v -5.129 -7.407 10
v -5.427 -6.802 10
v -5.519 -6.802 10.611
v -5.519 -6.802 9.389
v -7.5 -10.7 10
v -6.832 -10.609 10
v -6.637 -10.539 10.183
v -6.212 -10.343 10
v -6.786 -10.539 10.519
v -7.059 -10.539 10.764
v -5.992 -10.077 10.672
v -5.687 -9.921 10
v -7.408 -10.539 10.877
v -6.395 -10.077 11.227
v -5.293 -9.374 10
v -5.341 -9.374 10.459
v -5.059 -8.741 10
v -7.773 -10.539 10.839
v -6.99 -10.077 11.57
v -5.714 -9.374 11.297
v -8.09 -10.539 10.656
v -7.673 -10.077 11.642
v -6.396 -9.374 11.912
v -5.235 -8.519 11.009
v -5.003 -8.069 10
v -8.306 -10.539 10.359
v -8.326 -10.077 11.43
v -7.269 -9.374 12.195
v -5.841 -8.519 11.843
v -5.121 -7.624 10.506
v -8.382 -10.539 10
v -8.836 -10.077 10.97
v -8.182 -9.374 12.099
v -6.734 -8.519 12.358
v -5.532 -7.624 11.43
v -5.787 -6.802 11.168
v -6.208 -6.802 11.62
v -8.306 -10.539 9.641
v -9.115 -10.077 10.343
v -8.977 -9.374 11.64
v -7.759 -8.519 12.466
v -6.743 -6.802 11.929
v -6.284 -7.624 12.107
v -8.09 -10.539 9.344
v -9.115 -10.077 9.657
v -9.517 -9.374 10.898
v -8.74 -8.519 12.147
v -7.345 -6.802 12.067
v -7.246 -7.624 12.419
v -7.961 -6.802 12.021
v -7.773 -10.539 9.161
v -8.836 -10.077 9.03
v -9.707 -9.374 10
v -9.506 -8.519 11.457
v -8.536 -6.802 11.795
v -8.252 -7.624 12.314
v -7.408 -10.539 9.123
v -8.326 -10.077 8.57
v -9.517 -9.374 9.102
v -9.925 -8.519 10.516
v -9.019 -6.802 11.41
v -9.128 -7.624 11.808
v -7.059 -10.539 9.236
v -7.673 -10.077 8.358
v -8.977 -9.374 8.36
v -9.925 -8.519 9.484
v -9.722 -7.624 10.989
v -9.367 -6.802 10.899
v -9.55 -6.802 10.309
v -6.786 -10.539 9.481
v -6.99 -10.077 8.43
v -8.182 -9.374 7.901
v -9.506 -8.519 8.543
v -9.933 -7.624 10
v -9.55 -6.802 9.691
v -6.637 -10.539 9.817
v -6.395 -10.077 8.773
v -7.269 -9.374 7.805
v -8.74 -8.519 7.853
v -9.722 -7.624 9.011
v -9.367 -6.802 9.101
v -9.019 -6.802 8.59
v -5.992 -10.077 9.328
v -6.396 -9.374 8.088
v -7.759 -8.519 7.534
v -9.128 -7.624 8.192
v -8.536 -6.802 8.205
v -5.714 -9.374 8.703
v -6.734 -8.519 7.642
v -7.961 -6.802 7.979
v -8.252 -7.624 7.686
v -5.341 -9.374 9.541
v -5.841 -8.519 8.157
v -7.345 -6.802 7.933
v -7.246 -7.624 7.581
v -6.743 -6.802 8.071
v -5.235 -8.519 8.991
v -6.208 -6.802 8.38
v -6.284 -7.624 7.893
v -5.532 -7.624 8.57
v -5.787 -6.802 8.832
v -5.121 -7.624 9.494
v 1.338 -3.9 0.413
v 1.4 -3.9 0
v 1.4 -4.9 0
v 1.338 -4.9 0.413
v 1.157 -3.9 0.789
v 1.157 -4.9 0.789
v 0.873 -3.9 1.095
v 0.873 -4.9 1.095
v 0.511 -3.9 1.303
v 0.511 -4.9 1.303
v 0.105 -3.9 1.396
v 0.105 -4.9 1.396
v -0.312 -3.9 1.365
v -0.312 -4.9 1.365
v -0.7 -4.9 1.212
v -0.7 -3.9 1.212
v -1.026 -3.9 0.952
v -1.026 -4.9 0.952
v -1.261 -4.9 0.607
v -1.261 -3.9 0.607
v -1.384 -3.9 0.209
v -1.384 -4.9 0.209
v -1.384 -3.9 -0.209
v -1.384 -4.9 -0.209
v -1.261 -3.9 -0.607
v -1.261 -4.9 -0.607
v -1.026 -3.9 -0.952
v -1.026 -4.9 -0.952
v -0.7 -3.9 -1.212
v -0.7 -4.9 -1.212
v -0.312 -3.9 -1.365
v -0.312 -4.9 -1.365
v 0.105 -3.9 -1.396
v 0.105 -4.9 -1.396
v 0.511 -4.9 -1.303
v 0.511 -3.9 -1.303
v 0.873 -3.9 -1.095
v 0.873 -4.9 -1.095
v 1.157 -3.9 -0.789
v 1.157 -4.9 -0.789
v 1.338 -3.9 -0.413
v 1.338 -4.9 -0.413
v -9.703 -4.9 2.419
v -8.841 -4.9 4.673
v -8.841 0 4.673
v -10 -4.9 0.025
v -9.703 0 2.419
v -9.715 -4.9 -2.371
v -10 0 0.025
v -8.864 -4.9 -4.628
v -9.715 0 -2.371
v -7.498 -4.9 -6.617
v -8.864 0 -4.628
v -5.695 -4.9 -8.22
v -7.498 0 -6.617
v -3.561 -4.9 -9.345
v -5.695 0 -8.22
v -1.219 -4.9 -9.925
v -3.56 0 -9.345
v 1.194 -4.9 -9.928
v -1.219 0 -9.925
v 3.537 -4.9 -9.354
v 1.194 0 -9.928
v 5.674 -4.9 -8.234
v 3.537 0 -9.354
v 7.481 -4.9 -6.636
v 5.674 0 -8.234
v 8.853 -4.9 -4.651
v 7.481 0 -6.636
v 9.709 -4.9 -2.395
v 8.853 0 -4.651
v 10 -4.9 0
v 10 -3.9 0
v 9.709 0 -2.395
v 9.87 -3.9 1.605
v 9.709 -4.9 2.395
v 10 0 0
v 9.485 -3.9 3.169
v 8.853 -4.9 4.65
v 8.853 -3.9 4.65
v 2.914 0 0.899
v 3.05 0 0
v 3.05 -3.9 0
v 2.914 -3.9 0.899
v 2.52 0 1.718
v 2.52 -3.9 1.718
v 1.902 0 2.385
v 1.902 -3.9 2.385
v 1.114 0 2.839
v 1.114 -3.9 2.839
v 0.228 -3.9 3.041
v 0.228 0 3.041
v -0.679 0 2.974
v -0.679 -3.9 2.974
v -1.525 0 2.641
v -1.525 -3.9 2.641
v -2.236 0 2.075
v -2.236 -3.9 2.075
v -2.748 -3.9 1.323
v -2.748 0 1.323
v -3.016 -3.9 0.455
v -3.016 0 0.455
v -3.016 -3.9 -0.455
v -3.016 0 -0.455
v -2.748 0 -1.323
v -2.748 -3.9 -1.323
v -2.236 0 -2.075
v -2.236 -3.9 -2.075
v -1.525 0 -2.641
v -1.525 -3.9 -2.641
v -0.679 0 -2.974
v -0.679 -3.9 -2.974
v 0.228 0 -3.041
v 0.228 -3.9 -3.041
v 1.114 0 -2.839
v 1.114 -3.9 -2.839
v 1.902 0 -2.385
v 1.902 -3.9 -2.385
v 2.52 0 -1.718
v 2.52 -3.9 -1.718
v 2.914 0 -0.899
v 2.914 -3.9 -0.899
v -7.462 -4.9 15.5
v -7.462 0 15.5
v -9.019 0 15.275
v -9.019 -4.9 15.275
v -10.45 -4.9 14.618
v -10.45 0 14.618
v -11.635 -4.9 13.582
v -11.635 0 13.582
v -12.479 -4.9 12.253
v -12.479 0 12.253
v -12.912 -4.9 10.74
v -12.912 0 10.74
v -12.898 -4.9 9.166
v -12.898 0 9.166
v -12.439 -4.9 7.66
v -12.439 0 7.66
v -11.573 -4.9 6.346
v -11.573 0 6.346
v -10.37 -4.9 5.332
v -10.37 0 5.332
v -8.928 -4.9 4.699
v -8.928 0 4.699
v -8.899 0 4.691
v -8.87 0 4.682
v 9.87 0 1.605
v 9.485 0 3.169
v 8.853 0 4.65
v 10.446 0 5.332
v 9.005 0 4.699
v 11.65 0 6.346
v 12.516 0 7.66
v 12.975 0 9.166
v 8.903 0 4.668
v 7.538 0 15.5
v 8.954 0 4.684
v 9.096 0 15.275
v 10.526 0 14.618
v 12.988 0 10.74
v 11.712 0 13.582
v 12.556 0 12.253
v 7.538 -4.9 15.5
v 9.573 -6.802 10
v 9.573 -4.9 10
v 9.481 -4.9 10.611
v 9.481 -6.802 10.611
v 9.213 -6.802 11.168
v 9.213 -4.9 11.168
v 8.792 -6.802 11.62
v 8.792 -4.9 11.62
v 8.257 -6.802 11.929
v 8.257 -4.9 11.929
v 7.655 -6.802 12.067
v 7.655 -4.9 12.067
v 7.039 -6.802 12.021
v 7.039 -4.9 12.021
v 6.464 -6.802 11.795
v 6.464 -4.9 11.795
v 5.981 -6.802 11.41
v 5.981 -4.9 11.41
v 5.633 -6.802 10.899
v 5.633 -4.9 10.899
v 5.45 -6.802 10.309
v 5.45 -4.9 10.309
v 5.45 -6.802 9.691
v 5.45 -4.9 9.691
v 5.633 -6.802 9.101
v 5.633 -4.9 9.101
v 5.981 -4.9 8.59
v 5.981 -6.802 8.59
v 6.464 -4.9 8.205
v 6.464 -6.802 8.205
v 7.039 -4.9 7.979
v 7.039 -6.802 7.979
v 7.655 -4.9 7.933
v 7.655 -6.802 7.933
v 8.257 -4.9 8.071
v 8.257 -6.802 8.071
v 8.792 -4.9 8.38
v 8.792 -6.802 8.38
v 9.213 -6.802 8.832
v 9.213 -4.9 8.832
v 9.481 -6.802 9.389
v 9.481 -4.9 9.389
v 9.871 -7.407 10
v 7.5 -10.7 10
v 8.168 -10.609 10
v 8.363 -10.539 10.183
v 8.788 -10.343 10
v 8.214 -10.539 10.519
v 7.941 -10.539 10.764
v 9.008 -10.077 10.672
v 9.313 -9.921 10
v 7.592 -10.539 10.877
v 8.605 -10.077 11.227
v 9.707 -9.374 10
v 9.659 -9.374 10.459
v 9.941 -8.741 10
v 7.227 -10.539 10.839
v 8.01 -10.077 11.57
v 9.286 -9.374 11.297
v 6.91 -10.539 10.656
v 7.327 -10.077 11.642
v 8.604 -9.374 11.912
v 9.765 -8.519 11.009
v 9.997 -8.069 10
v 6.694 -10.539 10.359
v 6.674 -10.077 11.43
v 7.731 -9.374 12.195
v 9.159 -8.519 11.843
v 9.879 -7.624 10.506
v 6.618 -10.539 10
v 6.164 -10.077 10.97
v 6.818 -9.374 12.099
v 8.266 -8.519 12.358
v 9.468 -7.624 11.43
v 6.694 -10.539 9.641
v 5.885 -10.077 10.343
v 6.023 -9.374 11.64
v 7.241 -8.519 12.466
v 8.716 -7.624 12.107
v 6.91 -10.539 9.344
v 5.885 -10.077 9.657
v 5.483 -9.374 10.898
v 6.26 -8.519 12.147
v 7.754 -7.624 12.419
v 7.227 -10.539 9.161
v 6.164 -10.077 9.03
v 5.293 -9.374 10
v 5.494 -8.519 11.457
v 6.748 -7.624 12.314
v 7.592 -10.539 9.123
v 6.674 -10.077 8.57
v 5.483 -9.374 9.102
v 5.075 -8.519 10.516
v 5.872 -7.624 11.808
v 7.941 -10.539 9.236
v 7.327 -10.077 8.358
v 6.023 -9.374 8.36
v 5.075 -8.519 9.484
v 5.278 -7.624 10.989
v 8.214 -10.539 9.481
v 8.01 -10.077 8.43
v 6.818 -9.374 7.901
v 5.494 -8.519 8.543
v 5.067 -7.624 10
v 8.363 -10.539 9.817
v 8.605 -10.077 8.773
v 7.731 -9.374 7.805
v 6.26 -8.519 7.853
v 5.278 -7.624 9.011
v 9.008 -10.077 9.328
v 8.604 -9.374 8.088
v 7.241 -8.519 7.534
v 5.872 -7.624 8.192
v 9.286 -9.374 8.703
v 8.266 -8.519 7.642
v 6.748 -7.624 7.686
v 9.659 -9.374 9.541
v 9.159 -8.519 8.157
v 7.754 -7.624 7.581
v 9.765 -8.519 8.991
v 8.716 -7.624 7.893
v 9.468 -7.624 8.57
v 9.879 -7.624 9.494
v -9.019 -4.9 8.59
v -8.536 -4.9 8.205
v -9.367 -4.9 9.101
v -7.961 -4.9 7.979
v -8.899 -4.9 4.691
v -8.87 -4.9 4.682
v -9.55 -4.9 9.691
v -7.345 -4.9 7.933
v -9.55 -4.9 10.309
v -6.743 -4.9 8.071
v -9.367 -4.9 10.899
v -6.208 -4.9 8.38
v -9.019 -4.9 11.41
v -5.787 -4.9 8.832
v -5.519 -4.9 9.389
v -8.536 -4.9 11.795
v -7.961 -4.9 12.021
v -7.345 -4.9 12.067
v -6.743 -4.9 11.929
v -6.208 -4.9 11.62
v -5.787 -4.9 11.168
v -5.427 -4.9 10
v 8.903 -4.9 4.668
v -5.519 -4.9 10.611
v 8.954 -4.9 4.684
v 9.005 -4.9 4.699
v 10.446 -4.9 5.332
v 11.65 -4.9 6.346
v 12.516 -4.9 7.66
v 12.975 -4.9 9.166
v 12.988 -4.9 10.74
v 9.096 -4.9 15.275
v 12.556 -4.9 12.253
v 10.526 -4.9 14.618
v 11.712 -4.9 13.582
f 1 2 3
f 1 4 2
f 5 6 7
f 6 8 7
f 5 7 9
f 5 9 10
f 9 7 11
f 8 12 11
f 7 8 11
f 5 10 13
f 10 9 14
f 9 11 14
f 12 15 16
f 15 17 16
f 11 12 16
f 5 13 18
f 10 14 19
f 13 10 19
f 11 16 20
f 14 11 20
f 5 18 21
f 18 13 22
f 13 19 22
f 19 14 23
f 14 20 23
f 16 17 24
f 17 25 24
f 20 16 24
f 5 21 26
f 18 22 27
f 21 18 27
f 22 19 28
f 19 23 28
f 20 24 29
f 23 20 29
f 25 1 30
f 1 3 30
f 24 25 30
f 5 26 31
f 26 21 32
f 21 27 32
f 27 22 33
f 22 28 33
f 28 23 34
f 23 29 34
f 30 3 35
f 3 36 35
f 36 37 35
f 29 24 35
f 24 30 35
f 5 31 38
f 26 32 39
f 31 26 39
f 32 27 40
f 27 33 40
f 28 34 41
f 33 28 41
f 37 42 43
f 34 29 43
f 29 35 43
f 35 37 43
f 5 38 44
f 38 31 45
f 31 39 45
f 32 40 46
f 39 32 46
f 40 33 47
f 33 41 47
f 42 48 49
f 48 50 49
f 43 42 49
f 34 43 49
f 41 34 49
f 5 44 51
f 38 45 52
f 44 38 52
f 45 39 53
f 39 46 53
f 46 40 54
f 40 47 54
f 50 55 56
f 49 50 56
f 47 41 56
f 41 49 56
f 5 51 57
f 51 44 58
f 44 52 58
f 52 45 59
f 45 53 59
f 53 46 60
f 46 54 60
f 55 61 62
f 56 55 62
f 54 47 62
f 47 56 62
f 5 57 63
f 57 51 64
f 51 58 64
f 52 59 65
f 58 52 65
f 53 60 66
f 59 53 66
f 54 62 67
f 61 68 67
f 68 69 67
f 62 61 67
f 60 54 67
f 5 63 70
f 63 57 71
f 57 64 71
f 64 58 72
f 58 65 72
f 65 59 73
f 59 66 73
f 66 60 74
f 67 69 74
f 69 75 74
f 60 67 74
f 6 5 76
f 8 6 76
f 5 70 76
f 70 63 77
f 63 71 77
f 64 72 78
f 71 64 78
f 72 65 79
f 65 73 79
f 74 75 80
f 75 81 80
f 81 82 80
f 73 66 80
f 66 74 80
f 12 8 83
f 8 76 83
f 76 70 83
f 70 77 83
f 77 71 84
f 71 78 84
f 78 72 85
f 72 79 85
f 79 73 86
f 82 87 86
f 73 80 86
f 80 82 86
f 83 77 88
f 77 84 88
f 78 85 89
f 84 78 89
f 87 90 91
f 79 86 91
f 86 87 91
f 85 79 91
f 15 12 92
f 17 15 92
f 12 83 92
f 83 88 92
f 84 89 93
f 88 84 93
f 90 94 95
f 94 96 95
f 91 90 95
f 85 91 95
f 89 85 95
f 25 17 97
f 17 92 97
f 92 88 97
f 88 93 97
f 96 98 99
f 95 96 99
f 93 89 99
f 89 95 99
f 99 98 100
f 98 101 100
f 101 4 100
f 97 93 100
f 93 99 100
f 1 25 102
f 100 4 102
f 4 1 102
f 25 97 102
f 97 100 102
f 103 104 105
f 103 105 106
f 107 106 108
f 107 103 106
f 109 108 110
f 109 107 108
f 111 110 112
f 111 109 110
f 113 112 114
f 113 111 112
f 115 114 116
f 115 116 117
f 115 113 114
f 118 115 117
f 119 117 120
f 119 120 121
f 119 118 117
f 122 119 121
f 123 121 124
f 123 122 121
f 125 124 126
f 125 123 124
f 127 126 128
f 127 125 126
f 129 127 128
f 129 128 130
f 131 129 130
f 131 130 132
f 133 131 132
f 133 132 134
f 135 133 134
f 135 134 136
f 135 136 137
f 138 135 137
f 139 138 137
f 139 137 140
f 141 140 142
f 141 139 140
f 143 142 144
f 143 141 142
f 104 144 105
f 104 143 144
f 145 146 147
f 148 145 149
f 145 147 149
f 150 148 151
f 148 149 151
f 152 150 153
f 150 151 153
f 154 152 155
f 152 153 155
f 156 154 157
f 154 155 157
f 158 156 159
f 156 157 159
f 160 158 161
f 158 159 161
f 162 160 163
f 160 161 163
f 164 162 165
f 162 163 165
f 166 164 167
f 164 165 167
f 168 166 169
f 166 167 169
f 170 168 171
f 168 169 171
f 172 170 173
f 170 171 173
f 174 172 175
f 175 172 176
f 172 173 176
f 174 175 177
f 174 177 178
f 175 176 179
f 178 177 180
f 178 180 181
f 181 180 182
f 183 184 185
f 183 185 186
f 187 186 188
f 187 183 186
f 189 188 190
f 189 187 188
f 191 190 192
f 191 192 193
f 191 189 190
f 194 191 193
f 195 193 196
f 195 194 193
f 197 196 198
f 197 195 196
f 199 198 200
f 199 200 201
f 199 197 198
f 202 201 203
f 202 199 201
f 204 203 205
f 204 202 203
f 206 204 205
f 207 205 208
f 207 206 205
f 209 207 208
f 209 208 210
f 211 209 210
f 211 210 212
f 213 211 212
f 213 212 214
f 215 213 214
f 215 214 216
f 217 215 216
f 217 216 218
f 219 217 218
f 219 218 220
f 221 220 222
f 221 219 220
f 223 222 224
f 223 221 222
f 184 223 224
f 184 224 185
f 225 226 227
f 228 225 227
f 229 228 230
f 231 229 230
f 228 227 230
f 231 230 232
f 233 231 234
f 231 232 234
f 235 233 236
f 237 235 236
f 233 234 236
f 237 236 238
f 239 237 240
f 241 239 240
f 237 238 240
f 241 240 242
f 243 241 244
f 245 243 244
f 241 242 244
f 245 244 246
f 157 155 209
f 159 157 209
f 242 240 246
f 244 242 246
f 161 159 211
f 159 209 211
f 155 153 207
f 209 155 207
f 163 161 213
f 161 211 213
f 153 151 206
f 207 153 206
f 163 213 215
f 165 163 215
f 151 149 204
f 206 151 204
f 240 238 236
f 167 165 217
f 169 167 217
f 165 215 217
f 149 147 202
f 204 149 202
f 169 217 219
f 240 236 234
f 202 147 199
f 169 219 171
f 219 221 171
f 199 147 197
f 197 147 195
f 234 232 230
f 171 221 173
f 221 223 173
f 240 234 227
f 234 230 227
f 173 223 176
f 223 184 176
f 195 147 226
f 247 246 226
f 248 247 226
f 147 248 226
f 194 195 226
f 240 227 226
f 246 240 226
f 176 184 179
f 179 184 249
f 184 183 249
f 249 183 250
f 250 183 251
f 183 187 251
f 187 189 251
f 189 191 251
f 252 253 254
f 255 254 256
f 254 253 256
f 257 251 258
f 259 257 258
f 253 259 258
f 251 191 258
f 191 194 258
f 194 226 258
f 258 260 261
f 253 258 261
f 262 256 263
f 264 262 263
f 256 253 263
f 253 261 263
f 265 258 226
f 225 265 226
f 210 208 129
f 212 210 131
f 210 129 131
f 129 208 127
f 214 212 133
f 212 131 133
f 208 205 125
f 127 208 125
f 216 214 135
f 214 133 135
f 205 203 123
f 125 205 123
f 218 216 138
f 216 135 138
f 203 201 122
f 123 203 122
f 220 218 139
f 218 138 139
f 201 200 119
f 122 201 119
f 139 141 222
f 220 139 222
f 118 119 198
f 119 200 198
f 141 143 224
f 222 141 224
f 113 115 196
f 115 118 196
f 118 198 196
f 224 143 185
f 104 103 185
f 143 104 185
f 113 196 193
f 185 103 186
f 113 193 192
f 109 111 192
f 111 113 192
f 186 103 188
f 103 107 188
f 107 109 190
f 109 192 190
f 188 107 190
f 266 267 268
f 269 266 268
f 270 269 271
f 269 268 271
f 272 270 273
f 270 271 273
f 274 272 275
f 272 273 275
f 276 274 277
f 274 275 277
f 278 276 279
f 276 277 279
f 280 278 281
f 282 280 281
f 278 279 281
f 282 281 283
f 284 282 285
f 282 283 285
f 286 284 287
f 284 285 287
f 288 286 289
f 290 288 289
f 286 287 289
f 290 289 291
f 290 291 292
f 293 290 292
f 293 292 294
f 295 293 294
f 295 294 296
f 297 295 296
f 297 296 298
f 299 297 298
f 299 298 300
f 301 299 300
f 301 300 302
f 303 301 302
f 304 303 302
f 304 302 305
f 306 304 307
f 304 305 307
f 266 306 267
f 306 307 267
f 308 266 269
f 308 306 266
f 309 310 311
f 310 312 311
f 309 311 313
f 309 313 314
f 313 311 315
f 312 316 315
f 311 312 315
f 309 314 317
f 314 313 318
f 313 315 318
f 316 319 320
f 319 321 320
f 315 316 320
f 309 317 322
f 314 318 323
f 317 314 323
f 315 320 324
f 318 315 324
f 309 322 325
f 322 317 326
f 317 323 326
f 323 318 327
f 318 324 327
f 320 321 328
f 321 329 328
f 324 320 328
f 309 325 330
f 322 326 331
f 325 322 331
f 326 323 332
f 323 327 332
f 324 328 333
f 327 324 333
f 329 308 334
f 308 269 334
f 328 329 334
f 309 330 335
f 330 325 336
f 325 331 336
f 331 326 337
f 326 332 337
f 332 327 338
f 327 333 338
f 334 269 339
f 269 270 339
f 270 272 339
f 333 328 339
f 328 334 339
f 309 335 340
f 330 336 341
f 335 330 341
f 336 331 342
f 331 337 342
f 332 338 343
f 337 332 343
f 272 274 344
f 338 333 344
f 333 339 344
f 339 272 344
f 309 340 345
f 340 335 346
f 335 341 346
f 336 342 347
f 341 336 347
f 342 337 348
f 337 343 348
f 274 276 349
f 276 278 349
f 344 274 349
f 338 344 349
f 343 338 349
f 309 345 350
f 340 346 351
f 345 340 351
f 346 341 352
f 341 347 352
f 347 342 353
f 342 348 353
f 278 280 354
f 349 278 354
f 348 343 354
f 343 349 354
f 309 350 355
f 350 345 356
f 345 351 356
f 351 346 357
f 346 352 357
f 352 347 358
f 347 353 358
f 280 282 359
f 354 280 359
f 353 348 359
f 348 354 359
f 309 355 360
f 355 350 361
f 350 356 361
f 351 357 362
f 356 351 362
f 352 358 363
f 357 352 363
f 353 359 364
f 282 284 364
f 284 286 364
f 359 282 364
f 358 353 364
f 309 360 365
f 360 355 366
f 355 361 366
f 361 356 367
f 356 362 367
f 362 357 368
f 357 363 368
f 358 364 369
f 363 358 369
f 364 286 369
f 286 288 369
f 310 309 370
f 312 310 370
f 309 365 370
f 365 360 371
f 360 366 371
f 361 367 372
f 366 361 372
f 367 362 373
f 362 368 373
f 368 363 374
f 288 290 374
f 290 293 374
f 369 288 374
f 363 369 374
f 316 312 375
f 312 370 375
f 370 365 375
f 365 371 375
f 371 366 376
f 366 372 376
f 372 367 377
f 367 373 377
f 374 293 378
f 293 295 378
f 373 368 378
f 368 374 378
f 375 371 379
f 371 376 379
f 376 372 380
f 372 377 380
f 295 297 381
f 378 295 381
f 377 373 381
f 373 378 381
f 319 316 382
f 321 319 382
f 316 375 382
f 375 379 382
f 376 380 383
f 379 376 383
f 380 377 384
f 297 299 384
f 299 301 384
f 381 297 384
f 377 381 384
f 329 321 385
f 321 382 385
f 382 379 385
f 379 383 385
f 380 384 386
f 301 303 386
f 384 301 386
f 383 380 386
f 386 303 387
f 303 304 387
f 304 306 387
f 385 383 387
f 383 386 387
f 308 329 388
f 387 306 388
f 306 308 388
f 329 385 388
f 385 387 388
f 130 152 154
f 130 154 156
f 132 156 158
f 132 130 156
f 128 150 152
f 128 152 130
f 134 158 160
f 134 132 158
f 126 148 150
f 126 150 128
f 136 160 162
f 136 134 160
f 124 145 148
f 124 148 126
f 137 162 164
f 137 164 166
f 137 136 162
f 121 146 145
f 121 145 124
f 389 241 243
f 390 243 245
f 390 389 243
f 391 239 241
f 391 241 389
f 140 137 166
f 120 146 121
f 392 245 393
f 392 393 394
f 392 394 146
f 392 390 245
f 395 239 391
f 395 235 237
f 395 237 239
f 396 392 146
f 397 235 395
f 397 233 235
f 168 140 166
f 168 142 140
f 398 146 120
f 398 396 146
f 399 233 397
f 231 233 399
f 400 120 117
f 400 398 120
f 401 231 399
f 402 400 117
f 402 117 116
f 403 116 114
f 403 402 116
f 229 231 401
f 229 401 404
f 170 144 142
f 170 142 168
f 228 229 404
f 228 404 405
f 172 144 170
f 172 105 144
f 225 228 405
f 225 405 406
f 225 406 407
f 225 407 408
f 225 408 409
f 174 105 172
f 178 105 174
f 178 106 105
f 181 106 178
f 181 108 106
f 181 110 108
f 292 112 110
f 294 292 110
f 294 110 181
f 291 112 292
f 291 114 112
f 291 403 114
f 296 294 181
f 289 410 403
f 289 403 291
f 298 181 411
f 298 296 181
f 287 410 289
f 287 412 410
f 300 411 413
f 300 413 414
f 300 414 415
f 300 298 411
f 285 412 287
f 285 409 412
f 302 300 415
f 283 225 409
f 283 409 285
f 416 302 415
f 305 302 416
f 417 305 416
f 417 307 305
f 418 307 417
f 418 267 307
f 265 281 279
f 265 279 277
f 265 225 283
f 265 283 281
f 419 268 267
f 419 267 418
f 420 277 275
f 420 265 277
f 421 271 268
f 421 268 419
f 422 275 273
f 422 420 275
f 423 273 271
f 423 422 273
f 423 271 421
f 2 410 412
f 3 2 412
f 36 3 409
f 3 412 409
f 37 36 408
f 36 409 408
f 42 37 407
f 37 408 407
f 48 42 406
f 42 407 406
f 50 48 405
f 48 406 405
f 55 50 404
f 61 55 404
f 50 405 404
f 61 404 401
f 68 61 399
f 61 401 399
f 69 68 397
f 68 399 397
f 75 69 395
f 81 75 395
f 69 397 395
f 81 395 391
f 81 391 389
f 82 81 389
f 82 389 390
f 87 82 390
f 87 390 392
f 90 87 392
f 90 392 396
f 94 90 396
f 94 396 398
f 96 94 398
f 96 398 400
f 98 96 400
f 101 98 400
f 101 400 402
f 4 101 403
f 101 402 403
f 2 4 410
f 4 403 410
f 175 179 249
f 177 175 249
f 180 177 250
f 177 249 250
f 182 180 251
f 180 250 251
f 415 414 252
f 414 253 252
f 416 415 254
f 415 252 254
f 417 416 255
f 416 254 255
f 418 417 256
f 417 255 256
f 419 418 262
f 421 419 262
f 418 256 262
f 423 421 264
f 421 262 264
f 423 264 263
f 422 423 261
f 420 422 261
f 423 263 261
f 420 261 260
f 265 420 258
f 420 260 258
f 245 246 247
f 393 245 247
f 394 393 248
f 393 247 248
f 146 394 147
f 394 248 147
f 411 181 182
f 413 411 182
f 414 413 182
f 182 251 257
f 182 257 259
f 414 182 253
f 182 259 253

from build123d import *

# Parameters (mm, degrees)
F0_R     = 3.05
F1_DEPTH = 3.9
F2_R     = 3.05
F2_R_2   = 1.4
F3_DEPTH = 1


with BuildPart() as f1:
    # F0 (on Front) → F1 (new body)
    with BuildSketch(Plane.XZ):
        with BuildLine():
            ThreePointArc((7.5383832306, 6.5705995365), (8.2516737727, 5.6488830709), (8.8528781464, 4.6504353048))
            ThreePointArc((8.8528781464, 4.6504353048), (8.9284772277, 4.6763186551), (9.0050498972, 4.6991614919))
            ThreePointArc((9.0050498972, 4.6991614919), (12.9883654229, 10.7400635802), (7.5383832306, 15.5))
            Line((7.5383832306, 15.5), (-7.4616167694, 15.5))
            ThreePointArc((-7.4616167694, 15.5), (-12.9115989618, 10.7400635802), (-8.9282834361, 4.6991614919))
            ThreePointArc((-8.9282834361, 4.6991614919), (-8.8845194647, 4.6865143215), (-8.8410548965, 4.6728736679))
            ThreePointArc((-8.8410548965, 4.6728736679), (-8.2115228808, 5.7070913763), (-7.4616167694, 6.6576478719))
            ThreePointArc((-7.4616167694, 6.6576478719), (-4.0880020353, 9.1262390589), (0, 10))
            ThreePointArc((0, 10), (4.1408939032, 9.1023622034), (7.5383832306, 6.5705995365))
        make_face()
        with BuildLine():
            ThreePointArc((-7.4616167694, 6.6576478719), (-8.2115228808, 5.7070913763), (-8.8410548965, 4.6728736679))
            ThreePointArc((-8.8410548965, 4.6728736679), (-7.84280181, 3.9460786917), (-7.4616167694, 2.7715838526))
            Line((-7.4616167694, 2.7715838526), (-7.4616167694, 6.6576478719))
        make_face()
        with BuildLine():
            ThreePointArc((-8.8410548965, 4.6728736679), (-2.4072236118, -9.7059401648), (10, 0))
            ThreePointArc((10, 0), (9.7089850516, 2.3949132068), (8.8528781464, 4.6504353048))
            ThreePointArc((8.8528781464, 4.6504353048), (7.8996321561, 3.9180980984), (7.5383832306, 2.7715838526))
            Line((7.5383832306, 2.7715838526), (7.5383832306, 6.5705995365))
            ThreePointArc((7.5383832306, 6.5705995365), (4.1408939032, 9.1023622034), (0, 10))
            ThreePointArc((0, 10), (-4.0880020353, 9.1262390589), (-7.4616167694, 6.6576478719))
            Line((-7.4616167694, 6.6576478719), (-7.4616167694, 2.7715838526))
            ThreePointArc((-7.4616167694, 2.7715838526), (-7.84280181, 3.9460786917), (-8.8410548965, 4.6728736679))
        make_face()
        Circle(F0_R, mode=Mode.SUBTRACT)
        with BuildLine():
            ThreePointArc((7.5383832306, 2.7715838526), (7.8996321561, 3.9180980984), (8.8528781464, 4.6504353048))
            ThreePointArc((8.8528781464, 4.6504353048), (8.2516737727, 5.6488830709), (7.5383832306, 6.5705995365))
            Line((7.5383832306, 6.5705995365), (7.5383832306, 2.7715838526))
        make_face()
    extrude(amount=F1_DEPTH)

    # F2 (on face) → F3 (join)
    with BuildSketch(Plane.XZ.offset(3.9)):
        with BuildLine():
            ThreePointArc((-8.9282834361, 4.6991614919), (-8.8845194647, 4.6865143215), (-8.8410548965, 4.6728736679))
            ThreePointArc((-8.8410548965, 4.6728736679), (-0.0126813778, -9.9999919591), (8.8528781464, 4.6504353048))
            ThreePointArc((8.8528781464, 4.6504353048), (8.9284772277, 4.6763186551), (9.0050498972, 4.6991614919))
            ThreePointArc((9.0050498972, 4.6991614919), (12.9883654229, 10.7400635802), (7.5383832306, 15.5))
            Line((7.5383832306, 15.5), (-7.4616167694, 15.5))
            ThreePointArc((-7.4616167694, 15.5), (-12.9115989618, 10.7400635802), (-8.9282834361, 4.6991614919))
        make_face()
        Circle(F2_R, mode=Mode.SUBTRACT)
        Circle(F2_R)
        Circle(F2_R_2, mode=Mode.SUBTRACT)
    extrude(amount=F3_DEPTH)

    # F5 (on offset) → F6 (revolve)
    with BuildSketch(Plane.XY.offset(10)):
        with BuildLine():
            Line((-7.5, -5.7002530202), (-7.5, -10.7002530202))
            ThreePointArc((-7.5, -10.7002530202), (-5.2926553092, -9.3739776115), (-5.427348204, -6.8023565532))
            ThreePointArc((-5.427348204, -6.8023565532), (-6.3262754087, -5.9929083295), (-7.5, -5.7002530202))
        make_face()
        with BuildLine():
            ThreePointArc((-7.5, -5.7002530202), (-6.3262754087, -5.9929083295), (-5.427348204, -6.8023565532))
            Line((-5.427348204, -6.8023565532), (-5.427348204, -4.8014420412))
            Line((-5.427348204, -4.8014420412), (-7.5, -4.8014420412))
            Line((-7.5, -4.8014420412), (-7.5, -4.8982134417))
            Line((-7.5, -4.8982134417), (-7.5, -5.7002530202))
        make_face()
    revolve(axis=Axis((-7.5, -4.8982134417, 10), (0, -1, 0)))

    # F5 (on offset) → F7 (revolve)
    with BuildSketch(Plane.XY.offset(10)):
        with BuildLine():
            ThreePointArc((7.5, -5.7002530202), (8.6737245913, -5.9929083295), (9.572651796, -6.8023565532))
            Line((9.572651796, -6.8023565532), (9.572651796, -4.7845813774))
            Line((9.572651796, -4.7845813774), (7.5, -4.7845813774))
            Line((7.5, -4.7845813774), (7.5, -5.7002530202))
        make_face()
        with BuildLine():
            Line((7.5, -5.7002530202), (7.5, -10.7002530202))
            ThreePointArc((7.5, -10.7002530202), (9.7073446908, -9.3739776115), (9.572651796, -6.8023565532))
            ThreePointArc((9.572651796, -6.8023565532), (8.6737245913, -5.9929083295), (7.5, -5.7002530202))
        make_face()
    revolve(axis=Axis((7.5, -4.7317600206, 10), (0, -1, 0)))


solid = f1.part
